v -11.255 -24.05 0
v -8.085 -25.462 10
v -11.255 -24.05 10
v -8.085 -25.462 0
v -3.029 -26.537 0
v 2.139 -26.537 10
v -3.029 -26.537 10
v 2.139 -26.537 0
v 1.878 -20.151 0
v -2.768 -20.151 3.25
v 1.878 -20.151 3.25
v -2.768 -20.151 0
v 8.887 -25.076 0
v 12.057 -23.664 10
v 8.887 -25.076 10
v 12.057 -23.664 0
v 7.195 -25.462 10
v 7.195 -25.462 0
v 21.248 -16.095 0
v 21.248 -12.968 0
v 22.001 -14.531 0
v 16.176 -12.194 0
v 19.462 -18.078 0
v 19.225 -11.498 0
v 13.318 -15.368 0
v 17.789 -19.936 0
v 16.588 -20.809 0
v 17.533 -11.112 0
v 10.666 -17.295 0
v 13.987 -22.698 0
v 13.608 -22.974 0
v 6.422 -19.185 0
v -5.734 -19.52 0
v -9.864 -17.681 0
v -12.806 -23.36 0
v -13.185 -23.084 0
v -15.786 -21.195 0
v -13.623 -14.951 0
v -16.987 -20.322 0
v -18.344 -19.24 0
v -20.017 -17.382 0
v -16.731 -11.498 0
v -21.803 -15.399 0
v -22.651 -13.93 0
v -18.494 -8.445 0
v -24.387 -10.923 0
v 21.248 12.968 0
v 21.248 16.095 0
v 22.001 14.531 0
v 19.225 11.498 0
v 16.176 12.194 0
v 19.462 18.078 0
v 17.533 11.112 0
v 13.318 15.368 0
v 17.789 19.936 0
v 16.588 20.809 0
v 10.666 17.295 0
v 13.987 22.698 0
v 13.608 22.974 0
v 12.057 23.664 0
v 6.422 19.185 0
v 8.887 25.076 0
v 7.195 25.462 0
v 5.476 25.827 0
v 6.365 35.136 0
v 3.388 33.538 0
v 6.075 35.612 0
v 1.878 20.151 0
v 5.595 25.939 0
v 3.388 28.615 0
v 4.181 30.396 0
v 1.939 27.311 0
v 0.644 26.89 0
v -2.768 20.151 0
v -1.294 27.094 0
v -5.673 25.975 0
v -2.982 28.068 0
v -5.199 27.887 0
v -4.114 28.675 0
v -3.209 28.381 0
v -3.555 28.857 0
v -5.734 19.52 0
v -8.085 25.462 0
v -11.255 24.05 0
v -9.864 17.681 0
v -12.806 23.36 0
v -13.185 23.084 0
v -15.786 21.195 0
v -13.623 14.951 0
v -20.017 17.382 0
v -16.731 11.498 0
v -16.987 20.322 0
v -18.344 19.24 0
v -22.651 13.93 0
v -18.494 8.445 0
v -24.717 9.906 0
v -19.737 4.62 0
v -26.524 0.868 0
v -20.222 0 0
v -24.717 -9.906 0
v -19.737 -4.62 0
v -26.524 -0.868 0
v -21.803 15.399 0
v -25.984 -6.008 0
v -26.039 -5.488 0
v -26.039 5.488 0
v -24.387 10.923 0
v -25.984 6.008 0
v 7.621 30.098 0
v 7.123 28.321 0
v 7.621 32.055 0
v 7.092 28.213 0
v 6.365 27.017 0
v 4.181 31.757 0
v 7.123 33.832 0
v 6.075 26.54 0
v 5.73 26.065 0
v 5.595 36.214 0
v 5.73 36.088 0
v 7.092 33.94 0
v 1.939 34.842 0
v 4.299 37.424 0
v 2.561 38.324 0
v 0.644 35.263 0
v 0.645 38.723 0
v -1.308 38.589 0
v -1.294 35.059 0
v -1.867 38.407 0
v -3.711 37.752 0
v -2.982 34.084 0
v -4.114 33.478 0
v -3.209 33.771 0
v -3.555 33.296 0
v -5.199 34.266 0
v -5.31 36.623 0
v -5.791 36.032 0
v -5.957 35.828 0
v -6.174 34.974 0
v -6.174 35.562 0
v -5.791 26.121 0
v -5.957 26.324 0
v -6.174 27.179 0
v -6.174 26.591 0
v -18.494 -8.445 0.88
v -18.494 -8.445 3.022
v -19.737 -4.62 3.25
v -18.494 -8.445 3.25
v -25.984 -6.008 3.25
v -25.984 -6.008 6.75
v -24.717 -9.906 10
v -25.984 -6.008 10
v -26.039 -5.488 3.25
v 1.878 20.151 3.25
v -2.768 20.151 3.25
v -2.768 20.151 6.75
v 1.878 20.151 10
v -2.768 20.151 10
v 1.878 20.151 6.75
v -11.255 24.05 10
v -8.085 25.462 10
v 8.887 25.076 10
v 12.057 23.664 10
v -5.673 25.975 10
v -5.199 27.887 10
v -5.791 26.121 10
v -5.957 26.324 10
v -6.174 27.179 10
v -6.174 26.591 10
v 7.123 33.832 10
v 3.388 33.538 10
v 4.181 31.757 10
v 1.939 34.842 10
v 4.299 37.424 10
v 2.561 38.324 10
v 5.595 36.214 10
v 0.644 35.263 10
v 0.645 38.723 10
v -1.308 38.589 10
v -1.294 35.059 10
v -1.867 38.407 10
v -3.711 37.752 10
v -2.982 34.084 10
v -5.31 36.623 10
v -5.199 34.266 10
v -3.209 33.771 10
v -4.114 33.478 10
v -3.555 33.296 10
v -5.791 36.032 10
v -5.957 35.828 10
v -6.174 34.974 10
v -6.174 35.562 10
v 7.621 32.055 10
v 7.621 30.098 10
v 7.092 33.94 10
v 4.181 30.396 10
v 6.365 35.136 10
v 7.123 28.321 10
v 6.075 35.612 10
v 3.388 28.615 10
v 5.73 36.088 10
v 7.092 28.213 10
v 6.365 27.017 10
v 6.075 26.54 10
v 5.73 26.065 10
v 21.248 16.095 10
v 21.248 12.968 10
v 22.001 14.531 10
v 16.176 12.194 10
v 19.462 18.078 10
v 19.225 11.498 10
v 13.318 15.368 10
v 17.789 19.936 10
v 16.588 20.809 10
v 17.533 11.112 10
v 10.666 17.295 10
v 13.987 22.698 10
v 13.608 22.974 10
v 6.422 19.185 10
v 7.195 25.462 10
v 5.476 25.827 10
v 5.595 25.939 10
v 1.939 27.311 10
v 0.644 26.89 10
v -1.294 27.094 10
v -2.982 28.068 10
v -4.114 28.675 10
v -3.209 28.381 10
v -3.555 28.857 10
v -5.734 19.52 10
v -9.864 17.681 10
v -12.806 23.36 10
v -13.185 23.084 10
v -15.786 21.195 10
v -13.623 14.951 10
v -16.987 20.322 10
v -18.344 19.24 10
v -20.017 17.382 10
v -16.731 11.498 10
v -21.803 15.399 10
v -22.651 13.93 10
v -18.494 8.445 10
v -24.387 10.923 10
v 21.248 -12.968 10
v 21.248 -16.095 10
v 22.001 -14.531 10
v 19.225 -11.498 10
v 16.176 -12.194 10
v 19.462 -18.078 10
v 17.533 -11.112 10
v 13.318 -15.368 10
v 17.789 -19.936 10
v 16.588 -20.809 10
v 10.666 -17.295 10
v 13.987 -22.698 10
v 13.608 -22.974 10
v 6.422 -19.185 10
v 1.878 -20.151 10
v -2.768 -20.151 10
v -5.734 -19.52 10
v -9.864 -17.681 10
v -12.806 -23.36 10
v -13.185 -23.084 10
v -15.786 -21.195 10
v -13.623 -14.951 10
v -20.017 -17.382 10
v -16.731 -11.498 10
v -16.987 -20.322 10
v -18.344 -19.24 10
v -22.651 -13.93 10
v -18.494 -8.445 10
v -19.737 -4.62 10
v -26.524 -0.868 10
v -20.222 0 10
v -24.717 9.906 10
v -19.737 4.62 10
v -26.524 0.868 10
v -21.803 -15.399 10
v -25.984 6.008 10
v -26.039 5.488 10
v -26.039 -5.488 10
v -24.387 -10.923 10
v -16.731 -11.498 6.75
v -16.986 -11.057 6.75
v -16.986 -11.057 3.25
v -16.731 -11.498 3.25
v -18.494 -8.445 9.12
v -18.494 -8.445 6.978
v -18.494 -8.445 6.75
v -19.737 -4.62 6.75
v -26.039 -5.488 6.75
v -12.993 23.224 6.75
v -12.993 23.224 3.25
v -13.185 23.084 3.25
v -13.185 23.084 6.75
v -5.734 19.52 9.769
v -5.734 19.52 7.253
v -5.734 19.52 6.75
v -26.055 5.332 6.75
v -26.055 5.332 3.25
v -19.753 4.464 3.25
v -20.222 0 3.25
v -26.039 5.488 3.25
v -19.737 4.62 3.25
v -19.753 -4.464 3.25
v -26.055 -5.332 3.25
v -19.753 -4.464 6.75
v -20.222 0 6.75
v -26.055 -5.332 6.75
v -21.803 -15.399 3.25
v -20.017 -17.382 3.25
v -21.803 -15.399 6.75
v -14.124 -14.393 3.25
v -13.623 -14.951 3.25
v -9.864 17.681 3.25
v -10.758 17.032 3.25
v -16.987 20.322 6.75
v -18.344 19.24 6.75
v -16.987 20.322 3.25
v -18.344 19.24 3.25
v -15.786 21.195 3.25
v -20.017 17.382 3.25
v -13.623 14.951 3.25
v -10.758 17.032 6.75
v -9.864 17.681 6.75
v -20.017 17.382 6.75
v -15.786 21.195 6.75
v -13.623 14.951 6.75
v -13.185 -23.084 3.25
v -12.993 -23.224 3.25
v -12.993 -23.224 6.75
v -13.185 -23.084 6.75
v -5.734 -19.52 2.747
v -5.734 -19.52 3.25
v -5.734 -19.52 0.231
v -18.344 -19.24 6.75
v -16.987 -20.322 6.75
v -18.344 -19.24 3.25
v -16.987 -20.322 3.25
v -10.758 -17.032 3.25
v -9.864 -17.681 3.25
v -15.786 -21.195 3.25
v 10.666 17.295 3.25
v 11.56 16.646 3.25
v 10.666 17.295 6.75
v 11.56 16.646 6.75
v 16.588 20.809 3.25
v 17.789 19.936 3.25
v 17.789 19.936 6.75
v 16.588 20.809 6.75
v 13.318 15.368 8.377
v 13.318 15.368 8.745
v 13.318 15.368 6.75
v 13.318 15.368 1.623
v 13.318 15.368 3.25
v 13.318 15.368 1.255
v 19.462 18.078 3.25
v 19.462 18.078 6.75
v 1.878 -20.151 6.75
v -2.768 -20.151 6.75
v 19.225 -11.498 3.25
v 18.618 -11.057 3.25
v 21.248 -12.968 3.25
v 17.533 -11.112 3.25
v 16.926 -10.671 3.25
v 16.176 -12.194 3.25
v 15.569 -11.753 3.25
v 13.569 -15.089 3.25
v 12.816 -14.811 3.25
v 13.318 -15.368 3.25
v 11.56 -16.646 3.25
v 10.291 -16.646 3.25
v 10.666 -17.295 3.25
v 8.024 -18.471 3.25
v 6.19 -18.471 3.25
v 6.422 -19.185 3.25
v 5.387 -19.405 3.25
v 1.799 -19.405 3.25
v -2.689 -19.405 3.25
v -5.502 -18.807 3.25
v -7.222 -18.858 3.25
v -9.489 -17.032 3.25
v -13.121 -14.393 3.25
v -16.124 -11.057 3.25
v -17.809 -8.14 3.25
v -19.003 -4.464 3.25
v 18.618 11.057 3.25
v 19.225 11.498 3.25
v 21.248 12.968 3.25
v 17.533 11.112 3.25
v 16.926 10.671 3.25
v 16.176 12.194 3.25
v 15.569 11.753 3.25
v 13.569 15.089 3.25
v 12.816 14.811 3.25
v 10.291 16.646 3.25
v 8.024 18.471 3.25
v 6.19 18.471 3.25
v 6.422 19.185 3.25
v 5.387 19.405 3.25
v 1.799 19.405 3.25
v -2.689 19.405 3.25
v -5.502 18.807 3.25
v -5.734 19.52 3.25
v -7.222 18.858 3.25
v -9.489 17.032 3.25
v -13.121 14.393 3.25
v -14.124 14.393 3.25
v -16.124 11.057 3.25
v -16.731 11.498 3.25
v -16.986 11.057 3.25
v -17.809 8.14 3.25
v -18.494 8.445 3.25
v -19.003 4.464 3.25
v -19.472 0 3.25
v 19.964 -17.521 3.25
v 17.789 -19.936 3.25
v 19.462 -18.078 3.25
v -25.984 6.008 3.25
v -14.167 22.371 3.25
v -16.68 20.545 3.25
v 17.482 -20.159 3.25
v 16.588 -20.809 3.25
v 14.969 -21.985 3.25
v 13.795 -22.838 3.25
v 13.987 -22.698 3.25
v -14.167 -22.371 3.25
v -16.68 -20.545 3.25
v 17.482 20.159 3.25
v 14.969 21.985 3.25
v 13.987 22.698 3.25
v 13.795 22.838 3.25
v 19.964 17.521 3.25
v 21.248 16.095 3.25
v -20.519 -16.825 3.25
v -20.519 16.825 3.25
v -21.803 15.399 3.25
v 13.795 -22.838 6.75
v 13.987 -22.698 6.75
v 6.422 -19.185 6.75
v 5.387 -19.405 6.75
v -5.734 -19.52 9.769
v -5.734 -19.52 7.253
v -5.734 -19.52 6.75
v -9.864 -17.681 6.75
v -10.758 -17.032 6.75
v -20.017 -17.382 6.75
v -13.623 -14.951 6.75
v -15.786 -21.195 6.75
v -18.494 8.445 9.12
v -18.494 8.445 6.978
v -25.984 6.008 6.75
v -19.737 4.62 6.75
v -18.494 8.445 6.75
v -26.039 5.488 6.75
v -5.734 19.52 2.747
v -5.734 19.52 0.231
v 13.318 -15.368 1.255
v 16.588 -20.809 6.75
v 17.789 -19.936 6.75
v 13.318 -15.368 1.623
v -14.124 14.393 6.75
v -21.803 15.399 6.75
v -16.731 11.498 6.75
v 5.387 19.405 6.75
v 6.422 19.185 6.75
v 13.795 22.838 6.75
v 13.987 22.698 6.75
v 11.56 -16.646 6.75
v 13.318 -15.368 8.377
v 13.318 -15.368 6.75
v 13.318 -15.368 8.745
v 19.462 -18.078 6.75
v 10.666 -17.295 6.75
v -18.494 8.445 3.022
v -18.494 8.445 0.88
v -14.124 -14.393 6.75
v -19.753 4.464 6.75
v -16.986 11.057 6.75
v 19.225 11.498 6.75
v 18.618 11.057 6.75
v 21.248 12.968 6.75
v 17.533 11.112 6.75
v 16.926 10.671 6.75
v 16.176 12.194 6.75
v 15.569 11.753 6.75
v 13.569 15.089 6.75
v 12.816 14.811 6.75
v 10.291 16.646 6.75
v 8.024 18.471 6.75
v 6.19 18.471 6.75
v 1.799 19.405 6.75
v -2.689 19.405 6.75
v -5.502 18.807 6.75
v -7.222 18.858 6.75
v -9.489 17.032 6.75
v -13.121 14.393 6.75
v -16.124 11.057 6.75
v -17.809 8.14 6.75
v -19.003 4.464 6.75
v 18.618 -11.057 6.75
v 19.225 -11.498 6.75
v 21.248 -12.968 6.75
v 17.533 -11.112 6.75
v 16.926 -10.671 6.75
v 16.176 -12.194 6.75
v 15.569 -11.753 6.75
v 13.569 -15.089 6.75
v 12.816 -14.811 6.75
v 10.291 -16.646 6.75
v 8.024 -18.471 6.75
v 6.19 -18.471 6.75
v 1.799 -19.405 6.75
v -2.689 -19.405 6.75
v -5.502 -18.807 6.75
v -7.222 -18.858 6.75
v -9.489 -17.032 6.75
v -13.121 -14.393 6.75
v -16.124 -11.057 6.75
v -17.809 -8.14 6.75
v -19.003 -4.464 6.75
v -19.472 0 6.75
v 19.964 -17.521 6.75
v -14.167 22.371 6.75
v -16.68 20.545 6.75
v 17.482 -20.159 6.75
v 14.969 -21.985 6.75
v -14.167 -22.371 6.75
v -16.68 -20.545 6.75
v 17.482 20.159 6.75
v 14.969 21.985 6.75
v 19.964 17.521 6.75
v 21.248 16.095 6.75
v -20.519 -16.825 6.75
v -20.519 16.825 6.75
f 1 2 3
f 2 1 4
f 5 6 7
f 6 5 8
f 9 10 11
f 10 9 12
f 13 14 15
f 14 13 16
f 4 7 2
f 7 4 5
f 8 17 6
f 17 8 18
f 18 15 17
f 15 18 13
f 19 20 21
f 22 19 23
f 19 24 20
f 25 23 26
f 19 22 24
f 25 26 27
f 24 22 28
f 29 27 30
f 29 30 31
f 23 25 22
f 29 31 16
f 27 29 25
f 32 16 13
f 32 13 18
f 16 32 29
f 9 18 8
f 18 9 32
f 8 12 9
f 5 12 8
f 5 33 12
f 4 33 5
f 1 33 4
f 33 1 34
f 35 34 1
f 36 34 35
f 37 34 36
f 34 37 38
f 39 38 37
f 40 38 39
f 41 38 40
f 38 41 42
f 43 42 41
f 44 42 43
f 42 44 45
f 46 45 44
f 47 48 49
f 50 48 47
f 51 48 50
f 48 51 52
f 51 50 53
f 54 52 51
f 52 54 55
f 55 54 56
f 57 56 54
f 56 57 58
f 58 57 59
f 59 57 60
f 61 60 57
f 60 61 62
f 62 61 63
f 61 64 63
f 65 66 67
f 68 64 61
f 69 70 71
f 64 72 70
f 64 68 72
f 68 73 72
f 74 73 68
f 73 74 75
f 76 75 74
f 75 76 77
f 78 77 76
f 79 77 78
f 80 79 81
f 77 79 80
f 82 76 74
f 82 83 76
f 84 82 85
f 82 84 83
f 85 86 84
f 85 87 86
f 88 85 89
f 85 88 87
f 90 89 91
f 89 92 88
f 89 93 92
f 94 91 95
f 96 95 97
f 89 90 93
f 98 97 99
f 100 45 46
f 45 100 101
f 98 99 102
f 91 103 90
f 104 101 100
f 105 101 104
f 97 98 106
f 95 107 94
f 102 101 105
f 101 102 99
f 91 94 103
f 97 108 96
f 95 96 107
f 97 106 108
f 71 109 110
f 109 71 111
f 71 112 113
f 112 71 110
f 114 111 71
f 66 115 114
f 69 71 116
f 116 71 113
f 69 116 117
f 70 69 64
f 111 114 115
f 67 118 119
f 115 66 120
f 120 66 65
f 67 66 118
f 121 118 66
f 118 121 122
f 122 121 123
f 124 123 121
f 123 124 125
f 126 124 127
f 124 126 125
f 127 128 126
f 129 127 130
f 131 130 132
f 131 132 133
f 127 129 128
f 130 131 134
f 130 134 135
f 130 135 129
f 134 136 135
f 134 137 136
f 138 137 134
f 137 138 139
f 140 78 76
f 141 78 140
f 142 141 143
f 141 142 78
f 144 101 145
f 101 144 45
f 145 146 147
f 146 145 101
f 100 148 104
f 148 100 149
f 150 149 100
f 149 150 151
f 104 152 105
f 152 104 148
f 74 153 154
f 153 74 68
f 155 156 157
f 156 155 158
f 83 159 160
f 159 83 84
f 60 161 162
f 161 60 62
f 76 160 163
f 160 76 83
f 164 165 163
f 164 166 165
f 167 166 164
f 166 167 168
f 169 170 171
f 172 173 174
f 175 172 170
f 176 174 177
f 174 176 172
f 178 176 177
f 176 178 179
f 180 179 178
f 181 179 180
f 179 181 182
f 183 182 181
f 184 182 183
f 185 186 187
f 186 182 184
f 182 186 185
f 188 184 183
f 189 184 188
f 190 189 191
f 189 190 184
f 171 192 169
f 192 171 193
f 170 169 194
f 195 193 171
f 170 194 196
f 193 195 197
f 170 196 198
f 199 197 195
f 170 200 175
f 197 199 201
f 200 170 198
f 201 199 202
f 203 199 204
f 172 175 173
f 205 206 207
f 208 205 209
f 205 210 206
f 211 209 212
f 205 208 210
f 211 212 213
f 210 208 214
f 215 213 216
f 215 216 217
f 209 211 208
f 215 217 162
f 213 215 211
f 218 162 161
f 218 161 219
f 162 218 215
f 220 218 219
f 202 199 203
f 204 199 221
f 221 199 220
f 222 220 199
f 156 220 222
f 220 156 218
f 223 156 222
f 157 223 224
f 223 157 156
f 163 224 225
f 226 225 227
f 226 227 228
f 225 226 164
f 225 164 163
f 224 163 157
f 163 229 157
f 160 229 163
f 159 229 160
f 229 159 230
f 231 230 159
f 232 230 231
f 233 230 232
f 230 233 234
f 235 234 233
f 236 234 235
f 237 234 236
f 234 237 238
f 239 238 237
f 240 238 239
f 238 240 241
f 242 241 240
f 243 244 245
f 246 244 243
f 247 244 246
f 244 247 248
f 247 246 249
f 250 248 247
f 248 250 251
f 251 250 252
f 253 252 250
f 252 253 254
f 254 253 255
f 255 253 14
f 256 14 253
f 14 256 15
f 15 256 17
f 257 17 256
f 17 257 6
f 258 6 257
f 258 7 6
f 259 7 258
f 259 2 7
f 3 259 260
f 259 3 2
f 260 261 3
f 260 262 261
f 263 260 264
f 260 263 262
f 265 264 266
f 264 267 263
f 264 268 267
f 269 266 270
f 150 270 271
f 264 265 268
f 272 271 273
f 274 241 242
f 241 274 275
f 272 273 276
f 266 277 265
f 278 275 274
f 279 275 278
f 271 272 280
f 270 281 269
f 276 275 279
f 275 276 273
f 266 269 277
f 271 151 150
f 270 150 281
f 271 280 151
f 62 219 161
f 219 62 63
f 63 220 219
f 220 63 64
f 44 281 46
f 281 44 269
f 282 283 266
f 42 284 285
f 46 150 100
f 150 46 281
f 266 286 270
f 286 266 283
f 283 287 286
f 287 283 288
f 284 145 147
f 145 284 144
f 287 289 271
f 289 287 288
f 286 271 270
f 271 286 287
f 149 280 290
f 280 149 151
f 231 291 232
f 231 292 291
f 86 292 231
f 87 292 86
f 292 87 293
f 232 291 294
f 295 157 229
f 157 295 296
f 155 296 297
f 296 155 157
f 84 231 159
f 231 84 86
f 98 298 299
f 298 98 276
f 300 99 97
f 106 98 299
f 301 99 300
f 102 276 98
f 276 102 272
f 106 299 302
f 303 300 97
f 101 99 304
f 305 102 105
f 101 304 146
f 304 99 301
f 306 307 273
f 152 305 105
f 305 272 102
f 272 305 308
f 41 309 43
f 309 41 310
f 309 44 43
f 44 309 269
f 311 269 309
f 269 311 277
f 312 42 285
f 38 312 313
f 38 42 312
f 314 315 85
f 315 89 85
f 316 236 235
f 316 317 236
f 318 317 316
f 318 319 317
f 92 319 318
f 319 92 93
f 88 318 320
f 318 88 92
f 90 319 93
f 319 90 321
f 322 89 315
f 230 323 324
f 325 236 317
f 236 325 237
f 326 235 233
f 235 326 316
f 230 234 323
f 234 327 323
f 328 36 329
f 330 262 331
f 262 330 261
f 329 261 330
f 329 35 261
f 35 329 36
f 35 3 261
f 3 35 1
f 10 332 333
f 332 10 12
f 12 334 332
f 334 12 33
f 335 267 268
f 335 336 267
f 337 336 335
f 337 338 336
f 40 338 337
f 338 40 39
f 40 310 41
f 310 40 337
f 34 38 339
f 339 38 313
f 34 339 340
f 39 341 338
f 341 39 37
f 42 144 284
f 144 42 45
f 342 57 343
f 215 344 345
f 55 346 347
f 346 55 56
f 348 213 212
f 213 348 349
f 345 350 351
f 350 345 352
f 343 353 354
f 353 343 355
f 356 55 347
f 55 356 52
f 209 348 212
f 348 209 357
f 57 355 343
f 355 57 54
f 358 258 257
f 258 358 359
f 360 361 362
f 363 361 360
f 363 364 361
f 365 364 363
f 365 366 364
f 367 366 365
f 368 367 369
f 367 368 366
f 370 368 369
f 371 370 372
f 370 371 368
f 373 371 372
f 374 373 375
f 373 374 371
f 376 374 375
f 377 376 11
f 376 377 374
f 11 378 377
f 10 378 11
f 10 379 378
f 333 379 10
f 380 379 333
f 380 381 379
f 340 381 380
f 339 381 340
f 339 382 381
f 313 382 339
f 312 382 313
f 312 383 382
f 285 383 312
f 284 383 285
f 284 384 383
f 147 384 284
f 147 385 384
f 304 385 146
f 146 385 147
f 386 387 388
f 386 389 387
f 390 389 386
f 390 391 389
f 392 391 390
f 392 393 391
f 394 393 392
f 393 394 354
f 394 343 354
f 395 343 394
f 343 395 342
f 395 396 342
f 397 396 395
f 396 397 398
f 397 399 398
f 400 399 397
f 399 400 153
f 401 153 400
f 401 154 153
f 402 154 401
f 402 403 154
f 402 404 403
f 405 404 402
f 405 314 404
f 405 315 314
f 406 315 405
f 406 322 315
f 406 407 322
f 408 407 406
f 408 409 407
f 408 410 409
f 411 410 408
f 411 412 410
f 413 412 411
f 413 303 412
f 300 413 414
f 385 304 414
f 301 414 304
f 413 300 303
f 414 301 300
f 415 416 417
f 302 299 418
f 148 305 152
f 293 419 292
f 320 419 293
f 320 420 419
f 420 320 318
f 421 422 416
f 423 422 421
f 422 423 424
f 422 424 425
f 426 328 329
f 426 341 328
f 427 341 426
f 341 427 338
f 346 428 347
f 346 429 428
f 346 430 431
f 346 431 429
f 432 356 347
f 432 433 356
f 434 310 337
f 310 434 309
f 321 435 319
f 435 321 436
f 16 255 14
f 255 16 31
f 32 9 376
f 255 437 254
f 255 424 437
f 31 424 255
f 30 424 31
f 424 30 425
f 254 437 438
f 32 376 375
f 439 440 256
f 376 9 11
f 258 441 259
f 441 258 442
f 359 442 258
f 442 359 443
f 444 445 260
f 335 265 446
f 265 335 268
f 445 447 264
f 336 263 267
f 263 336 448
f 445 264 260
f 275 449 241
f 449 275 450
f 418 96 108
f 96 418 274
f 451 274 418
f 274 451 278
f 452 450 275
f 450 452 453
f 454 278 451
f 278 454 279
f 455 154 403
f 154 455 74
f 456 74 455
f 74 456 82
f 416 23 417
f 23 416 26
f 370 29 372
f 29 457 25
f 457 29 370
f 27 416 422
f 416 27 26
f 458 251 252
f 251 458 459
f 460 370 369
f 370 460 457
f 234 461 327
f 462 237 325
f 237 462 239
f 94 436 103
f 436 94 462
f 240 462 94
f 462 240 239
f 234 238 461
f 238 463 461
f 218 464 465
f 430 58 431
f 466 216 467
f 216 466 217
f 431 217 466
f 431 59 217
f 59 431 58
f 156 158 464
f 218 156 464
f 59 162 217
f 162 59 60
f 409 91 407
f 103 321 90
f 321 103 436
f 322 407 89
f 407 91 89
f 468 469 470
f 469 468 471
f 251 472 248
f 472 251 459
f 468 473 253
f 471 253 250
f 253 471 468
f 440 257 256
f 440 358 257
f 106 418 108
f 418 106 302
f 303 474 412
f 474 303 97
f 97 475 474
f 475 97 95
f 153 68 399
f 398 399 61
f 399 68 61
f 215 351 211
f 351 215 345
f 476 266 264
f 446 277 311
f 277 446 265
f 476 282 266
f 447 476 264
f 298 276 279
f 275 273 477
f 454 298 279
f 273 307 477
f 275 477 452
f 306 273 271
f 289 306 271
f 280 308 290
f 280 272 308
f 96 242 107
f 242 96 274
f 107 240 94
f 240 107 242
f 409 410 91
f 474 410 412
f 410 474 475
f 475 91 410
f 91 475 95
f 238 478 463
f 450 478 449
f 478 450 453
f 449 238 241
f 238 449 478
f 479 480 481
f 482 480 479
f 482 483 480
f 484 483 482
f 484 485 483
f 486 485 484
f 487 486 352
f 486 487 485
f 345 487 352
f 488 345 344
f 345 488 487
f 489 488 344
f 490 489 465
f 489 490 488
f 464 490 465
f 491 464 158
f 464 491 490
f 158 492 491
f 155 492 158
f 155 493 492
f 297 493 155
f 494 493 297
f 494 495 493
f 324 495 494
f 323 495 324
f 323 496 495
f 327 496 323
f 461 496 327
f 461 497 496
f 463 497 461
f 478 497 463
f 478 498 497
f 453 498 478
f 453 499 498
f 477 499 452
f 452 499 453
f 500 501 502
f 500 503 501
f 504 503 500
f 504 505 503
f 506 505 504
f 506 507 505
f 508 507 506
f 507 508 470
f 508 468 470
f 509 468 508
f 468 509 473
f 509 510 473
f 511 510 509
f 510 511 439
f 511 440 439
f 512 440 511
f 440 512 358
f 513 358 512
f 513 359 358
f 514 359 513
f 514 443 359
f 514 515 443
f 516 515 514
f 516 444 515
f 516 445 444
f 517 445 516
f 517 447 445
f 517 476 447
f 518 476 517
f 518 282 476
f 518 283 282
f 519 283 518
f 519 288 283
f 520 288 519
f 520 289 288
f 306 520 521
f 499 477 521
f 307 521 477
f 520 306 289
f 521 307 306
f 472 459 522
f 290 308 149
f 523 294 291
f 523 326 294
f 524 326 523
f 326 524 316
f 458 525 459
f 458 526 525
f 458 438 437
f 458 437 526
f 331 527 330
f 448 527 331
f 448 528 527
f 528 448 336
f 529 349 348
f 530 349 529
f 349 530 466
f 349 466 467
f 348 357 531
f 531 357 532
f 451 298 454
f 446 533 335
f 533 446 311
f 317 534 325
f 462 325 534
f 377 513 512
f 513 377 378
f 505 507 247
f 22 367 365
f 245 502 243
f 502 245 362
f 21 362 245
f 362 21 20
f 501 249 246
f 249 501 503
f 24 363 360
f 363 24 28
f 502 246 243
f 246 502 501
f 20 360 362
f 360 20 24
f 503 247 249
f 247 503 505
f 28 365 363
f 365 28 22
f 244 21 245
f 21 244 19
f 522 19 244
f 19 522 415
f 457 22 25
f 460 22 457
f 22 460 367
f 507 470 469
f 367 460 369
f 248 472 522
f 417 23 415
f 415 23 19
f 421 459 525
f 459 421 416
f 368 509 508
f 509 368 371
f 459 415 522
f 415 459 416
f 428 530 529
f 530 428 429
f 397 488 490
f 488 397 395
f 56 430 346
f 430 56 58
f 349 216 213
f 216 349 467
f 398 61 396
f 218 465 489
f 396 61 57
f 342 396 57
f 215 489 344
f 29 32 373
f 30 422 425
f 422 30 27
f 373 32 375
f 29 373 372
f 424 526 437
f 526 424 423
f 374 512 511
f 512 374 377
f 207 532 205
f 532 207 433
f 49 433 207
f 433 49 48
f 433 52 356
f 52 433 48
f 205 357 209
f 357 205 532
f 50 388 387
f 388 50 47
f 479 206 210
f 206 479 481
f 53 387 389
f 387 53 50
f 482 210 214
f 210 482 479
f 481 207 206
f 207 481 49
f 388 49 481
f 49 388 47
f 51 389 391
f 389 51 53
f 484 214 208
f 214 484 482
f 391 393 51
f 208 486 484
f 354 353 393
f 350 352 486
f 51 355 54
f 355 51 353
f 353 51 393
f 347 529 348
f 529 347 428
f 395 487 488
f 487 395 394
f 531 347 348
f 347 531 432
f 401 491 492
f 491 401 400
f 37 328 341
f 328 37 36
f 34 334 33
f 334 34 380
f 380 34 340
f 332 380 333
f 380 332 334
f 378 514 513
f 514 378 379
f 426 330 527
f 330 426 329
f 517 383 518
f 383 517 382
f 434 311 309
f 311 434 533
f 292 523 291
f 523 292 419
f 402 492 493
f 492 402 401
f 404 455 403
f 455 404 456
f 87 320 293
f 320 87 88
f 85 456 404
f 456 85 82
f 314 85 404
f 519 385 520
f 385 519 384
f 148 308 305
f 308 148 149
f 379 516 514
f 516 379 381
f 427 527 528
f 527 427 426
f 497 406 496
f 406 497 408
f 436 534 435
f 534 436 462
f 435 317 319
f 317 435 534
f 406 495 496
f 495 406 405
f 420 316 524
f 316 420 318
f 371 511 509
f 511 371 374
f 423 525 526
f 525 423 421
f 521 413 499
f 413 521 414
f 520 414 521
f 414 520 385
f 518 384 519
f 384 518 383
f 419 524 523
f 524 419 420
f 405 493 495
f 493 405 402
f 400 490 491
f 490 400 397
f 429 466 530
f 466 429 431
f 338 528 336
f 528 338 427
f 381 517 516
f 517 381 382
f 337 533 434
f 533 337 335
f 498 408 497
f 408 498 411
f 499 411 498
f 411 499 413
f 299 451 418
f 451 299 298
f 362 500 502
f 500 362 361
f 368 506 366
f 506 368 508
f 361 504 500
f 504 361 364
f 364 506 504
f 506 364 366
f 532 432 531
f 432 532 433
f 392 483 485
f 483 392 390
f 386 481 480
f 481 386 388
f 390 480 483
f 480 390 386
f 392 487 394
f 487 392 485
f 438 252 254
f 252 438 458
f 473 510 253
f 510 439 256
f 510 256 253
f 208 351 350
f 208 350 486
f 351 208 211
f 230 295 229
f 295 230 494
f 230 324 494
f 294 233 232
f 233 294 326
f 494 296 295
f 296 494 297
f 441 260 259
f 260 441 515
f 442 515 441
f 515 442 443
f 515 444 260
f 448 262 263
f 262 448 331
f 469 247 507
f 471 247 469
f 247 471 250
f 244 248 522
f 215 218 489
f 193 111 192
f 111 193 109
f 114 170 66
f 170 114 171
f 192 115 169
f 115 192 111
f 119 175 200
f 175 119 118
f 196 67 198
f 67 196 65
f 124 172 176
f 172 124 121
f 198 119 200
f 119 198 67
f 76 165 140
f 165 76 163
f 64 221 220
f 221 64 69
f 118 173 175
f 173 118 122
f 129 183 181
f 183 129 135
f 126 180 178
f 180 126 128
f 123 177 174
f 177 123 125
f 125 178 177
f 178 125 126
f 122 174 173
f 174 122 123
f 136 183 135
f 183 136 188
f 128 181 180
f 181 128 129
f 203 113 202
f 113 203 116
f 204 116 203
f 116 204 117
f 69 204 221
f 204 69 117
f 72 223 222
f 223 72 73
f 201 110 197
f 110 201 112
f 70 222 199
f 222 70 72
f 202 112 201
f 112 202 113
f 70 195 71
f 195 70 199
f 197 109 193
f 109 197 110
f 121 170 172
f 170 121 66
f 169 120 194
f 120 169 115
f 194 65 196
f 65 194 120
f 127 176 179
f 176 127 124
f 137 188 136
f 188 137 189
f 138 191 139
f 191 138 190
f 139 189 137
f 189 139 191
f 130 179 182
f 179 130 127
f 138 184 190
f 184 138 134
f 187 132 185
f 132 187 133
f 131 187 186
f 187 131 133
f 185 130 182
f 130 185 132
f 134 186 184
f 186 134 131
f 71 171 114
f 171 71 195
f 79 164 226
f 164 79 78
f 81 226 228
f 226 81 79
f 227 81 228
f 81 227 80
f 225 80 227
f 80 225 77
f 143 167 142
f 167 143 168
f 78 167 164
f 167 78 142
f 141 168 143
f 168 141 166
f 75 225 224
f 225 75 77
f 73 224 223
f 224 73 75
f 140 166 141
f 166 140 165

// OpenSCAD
// Diameter of the hose
diam = 40;

diameter = diam * 40 / 36;
// Diameter of the cable
diac = 7.5;

diacable = diac * 7.5 / 6;
// Width of the ring
width = 5;
// Recess width
recessw = 1.5;
//recess height
recessh = 1.5;

thickness = 8;
openinghose = 0.2;
openingcable = 0.25;


space = (thickness-recessh)/2;
outside = 1.1 * ((diameter+width)/2);
echo(space);

  union() {

    minkowski() {
      difference() {
        cylinder(d=diameter+width, h=thickness);
        cylinder(d=diameter-recessw, h=thickness);
        cylinder(d=diameter, h=space);
        translate([0,0,thickness-space]) cylinder(d=diameter, h=space);
        linear_extrude(height=thickness) {
          rotate([0,0,-(180*openinghose)]) pie_slice(r=outside, a=360*openinghose);
        }
      }
      cylinder(r=2,h=2);
    }

    minkowski() {
      translate([0,(diameter+width)/2+diacable/2+width/3,0])
        mirror([1,0,0])
          difference() {
            cylinder(d=diacable+width, h=thickness);
            cylinder(d=diacable, h=thickness);
            linear_extrude(height=thickness) {
              rotate([0,0,-(180*openinghose)]) pie_slice(r=2*diacable/2, a=360*openinghose);
            }
          }
      cylinder(r=0.5,h=2);
   }


}

module pie_slice(r=3.0,a=30) {
  $fn=64;
  intersection() {
    circle(r=r);
    square(r);
    rotate(a-90) square(r);
  }
}
